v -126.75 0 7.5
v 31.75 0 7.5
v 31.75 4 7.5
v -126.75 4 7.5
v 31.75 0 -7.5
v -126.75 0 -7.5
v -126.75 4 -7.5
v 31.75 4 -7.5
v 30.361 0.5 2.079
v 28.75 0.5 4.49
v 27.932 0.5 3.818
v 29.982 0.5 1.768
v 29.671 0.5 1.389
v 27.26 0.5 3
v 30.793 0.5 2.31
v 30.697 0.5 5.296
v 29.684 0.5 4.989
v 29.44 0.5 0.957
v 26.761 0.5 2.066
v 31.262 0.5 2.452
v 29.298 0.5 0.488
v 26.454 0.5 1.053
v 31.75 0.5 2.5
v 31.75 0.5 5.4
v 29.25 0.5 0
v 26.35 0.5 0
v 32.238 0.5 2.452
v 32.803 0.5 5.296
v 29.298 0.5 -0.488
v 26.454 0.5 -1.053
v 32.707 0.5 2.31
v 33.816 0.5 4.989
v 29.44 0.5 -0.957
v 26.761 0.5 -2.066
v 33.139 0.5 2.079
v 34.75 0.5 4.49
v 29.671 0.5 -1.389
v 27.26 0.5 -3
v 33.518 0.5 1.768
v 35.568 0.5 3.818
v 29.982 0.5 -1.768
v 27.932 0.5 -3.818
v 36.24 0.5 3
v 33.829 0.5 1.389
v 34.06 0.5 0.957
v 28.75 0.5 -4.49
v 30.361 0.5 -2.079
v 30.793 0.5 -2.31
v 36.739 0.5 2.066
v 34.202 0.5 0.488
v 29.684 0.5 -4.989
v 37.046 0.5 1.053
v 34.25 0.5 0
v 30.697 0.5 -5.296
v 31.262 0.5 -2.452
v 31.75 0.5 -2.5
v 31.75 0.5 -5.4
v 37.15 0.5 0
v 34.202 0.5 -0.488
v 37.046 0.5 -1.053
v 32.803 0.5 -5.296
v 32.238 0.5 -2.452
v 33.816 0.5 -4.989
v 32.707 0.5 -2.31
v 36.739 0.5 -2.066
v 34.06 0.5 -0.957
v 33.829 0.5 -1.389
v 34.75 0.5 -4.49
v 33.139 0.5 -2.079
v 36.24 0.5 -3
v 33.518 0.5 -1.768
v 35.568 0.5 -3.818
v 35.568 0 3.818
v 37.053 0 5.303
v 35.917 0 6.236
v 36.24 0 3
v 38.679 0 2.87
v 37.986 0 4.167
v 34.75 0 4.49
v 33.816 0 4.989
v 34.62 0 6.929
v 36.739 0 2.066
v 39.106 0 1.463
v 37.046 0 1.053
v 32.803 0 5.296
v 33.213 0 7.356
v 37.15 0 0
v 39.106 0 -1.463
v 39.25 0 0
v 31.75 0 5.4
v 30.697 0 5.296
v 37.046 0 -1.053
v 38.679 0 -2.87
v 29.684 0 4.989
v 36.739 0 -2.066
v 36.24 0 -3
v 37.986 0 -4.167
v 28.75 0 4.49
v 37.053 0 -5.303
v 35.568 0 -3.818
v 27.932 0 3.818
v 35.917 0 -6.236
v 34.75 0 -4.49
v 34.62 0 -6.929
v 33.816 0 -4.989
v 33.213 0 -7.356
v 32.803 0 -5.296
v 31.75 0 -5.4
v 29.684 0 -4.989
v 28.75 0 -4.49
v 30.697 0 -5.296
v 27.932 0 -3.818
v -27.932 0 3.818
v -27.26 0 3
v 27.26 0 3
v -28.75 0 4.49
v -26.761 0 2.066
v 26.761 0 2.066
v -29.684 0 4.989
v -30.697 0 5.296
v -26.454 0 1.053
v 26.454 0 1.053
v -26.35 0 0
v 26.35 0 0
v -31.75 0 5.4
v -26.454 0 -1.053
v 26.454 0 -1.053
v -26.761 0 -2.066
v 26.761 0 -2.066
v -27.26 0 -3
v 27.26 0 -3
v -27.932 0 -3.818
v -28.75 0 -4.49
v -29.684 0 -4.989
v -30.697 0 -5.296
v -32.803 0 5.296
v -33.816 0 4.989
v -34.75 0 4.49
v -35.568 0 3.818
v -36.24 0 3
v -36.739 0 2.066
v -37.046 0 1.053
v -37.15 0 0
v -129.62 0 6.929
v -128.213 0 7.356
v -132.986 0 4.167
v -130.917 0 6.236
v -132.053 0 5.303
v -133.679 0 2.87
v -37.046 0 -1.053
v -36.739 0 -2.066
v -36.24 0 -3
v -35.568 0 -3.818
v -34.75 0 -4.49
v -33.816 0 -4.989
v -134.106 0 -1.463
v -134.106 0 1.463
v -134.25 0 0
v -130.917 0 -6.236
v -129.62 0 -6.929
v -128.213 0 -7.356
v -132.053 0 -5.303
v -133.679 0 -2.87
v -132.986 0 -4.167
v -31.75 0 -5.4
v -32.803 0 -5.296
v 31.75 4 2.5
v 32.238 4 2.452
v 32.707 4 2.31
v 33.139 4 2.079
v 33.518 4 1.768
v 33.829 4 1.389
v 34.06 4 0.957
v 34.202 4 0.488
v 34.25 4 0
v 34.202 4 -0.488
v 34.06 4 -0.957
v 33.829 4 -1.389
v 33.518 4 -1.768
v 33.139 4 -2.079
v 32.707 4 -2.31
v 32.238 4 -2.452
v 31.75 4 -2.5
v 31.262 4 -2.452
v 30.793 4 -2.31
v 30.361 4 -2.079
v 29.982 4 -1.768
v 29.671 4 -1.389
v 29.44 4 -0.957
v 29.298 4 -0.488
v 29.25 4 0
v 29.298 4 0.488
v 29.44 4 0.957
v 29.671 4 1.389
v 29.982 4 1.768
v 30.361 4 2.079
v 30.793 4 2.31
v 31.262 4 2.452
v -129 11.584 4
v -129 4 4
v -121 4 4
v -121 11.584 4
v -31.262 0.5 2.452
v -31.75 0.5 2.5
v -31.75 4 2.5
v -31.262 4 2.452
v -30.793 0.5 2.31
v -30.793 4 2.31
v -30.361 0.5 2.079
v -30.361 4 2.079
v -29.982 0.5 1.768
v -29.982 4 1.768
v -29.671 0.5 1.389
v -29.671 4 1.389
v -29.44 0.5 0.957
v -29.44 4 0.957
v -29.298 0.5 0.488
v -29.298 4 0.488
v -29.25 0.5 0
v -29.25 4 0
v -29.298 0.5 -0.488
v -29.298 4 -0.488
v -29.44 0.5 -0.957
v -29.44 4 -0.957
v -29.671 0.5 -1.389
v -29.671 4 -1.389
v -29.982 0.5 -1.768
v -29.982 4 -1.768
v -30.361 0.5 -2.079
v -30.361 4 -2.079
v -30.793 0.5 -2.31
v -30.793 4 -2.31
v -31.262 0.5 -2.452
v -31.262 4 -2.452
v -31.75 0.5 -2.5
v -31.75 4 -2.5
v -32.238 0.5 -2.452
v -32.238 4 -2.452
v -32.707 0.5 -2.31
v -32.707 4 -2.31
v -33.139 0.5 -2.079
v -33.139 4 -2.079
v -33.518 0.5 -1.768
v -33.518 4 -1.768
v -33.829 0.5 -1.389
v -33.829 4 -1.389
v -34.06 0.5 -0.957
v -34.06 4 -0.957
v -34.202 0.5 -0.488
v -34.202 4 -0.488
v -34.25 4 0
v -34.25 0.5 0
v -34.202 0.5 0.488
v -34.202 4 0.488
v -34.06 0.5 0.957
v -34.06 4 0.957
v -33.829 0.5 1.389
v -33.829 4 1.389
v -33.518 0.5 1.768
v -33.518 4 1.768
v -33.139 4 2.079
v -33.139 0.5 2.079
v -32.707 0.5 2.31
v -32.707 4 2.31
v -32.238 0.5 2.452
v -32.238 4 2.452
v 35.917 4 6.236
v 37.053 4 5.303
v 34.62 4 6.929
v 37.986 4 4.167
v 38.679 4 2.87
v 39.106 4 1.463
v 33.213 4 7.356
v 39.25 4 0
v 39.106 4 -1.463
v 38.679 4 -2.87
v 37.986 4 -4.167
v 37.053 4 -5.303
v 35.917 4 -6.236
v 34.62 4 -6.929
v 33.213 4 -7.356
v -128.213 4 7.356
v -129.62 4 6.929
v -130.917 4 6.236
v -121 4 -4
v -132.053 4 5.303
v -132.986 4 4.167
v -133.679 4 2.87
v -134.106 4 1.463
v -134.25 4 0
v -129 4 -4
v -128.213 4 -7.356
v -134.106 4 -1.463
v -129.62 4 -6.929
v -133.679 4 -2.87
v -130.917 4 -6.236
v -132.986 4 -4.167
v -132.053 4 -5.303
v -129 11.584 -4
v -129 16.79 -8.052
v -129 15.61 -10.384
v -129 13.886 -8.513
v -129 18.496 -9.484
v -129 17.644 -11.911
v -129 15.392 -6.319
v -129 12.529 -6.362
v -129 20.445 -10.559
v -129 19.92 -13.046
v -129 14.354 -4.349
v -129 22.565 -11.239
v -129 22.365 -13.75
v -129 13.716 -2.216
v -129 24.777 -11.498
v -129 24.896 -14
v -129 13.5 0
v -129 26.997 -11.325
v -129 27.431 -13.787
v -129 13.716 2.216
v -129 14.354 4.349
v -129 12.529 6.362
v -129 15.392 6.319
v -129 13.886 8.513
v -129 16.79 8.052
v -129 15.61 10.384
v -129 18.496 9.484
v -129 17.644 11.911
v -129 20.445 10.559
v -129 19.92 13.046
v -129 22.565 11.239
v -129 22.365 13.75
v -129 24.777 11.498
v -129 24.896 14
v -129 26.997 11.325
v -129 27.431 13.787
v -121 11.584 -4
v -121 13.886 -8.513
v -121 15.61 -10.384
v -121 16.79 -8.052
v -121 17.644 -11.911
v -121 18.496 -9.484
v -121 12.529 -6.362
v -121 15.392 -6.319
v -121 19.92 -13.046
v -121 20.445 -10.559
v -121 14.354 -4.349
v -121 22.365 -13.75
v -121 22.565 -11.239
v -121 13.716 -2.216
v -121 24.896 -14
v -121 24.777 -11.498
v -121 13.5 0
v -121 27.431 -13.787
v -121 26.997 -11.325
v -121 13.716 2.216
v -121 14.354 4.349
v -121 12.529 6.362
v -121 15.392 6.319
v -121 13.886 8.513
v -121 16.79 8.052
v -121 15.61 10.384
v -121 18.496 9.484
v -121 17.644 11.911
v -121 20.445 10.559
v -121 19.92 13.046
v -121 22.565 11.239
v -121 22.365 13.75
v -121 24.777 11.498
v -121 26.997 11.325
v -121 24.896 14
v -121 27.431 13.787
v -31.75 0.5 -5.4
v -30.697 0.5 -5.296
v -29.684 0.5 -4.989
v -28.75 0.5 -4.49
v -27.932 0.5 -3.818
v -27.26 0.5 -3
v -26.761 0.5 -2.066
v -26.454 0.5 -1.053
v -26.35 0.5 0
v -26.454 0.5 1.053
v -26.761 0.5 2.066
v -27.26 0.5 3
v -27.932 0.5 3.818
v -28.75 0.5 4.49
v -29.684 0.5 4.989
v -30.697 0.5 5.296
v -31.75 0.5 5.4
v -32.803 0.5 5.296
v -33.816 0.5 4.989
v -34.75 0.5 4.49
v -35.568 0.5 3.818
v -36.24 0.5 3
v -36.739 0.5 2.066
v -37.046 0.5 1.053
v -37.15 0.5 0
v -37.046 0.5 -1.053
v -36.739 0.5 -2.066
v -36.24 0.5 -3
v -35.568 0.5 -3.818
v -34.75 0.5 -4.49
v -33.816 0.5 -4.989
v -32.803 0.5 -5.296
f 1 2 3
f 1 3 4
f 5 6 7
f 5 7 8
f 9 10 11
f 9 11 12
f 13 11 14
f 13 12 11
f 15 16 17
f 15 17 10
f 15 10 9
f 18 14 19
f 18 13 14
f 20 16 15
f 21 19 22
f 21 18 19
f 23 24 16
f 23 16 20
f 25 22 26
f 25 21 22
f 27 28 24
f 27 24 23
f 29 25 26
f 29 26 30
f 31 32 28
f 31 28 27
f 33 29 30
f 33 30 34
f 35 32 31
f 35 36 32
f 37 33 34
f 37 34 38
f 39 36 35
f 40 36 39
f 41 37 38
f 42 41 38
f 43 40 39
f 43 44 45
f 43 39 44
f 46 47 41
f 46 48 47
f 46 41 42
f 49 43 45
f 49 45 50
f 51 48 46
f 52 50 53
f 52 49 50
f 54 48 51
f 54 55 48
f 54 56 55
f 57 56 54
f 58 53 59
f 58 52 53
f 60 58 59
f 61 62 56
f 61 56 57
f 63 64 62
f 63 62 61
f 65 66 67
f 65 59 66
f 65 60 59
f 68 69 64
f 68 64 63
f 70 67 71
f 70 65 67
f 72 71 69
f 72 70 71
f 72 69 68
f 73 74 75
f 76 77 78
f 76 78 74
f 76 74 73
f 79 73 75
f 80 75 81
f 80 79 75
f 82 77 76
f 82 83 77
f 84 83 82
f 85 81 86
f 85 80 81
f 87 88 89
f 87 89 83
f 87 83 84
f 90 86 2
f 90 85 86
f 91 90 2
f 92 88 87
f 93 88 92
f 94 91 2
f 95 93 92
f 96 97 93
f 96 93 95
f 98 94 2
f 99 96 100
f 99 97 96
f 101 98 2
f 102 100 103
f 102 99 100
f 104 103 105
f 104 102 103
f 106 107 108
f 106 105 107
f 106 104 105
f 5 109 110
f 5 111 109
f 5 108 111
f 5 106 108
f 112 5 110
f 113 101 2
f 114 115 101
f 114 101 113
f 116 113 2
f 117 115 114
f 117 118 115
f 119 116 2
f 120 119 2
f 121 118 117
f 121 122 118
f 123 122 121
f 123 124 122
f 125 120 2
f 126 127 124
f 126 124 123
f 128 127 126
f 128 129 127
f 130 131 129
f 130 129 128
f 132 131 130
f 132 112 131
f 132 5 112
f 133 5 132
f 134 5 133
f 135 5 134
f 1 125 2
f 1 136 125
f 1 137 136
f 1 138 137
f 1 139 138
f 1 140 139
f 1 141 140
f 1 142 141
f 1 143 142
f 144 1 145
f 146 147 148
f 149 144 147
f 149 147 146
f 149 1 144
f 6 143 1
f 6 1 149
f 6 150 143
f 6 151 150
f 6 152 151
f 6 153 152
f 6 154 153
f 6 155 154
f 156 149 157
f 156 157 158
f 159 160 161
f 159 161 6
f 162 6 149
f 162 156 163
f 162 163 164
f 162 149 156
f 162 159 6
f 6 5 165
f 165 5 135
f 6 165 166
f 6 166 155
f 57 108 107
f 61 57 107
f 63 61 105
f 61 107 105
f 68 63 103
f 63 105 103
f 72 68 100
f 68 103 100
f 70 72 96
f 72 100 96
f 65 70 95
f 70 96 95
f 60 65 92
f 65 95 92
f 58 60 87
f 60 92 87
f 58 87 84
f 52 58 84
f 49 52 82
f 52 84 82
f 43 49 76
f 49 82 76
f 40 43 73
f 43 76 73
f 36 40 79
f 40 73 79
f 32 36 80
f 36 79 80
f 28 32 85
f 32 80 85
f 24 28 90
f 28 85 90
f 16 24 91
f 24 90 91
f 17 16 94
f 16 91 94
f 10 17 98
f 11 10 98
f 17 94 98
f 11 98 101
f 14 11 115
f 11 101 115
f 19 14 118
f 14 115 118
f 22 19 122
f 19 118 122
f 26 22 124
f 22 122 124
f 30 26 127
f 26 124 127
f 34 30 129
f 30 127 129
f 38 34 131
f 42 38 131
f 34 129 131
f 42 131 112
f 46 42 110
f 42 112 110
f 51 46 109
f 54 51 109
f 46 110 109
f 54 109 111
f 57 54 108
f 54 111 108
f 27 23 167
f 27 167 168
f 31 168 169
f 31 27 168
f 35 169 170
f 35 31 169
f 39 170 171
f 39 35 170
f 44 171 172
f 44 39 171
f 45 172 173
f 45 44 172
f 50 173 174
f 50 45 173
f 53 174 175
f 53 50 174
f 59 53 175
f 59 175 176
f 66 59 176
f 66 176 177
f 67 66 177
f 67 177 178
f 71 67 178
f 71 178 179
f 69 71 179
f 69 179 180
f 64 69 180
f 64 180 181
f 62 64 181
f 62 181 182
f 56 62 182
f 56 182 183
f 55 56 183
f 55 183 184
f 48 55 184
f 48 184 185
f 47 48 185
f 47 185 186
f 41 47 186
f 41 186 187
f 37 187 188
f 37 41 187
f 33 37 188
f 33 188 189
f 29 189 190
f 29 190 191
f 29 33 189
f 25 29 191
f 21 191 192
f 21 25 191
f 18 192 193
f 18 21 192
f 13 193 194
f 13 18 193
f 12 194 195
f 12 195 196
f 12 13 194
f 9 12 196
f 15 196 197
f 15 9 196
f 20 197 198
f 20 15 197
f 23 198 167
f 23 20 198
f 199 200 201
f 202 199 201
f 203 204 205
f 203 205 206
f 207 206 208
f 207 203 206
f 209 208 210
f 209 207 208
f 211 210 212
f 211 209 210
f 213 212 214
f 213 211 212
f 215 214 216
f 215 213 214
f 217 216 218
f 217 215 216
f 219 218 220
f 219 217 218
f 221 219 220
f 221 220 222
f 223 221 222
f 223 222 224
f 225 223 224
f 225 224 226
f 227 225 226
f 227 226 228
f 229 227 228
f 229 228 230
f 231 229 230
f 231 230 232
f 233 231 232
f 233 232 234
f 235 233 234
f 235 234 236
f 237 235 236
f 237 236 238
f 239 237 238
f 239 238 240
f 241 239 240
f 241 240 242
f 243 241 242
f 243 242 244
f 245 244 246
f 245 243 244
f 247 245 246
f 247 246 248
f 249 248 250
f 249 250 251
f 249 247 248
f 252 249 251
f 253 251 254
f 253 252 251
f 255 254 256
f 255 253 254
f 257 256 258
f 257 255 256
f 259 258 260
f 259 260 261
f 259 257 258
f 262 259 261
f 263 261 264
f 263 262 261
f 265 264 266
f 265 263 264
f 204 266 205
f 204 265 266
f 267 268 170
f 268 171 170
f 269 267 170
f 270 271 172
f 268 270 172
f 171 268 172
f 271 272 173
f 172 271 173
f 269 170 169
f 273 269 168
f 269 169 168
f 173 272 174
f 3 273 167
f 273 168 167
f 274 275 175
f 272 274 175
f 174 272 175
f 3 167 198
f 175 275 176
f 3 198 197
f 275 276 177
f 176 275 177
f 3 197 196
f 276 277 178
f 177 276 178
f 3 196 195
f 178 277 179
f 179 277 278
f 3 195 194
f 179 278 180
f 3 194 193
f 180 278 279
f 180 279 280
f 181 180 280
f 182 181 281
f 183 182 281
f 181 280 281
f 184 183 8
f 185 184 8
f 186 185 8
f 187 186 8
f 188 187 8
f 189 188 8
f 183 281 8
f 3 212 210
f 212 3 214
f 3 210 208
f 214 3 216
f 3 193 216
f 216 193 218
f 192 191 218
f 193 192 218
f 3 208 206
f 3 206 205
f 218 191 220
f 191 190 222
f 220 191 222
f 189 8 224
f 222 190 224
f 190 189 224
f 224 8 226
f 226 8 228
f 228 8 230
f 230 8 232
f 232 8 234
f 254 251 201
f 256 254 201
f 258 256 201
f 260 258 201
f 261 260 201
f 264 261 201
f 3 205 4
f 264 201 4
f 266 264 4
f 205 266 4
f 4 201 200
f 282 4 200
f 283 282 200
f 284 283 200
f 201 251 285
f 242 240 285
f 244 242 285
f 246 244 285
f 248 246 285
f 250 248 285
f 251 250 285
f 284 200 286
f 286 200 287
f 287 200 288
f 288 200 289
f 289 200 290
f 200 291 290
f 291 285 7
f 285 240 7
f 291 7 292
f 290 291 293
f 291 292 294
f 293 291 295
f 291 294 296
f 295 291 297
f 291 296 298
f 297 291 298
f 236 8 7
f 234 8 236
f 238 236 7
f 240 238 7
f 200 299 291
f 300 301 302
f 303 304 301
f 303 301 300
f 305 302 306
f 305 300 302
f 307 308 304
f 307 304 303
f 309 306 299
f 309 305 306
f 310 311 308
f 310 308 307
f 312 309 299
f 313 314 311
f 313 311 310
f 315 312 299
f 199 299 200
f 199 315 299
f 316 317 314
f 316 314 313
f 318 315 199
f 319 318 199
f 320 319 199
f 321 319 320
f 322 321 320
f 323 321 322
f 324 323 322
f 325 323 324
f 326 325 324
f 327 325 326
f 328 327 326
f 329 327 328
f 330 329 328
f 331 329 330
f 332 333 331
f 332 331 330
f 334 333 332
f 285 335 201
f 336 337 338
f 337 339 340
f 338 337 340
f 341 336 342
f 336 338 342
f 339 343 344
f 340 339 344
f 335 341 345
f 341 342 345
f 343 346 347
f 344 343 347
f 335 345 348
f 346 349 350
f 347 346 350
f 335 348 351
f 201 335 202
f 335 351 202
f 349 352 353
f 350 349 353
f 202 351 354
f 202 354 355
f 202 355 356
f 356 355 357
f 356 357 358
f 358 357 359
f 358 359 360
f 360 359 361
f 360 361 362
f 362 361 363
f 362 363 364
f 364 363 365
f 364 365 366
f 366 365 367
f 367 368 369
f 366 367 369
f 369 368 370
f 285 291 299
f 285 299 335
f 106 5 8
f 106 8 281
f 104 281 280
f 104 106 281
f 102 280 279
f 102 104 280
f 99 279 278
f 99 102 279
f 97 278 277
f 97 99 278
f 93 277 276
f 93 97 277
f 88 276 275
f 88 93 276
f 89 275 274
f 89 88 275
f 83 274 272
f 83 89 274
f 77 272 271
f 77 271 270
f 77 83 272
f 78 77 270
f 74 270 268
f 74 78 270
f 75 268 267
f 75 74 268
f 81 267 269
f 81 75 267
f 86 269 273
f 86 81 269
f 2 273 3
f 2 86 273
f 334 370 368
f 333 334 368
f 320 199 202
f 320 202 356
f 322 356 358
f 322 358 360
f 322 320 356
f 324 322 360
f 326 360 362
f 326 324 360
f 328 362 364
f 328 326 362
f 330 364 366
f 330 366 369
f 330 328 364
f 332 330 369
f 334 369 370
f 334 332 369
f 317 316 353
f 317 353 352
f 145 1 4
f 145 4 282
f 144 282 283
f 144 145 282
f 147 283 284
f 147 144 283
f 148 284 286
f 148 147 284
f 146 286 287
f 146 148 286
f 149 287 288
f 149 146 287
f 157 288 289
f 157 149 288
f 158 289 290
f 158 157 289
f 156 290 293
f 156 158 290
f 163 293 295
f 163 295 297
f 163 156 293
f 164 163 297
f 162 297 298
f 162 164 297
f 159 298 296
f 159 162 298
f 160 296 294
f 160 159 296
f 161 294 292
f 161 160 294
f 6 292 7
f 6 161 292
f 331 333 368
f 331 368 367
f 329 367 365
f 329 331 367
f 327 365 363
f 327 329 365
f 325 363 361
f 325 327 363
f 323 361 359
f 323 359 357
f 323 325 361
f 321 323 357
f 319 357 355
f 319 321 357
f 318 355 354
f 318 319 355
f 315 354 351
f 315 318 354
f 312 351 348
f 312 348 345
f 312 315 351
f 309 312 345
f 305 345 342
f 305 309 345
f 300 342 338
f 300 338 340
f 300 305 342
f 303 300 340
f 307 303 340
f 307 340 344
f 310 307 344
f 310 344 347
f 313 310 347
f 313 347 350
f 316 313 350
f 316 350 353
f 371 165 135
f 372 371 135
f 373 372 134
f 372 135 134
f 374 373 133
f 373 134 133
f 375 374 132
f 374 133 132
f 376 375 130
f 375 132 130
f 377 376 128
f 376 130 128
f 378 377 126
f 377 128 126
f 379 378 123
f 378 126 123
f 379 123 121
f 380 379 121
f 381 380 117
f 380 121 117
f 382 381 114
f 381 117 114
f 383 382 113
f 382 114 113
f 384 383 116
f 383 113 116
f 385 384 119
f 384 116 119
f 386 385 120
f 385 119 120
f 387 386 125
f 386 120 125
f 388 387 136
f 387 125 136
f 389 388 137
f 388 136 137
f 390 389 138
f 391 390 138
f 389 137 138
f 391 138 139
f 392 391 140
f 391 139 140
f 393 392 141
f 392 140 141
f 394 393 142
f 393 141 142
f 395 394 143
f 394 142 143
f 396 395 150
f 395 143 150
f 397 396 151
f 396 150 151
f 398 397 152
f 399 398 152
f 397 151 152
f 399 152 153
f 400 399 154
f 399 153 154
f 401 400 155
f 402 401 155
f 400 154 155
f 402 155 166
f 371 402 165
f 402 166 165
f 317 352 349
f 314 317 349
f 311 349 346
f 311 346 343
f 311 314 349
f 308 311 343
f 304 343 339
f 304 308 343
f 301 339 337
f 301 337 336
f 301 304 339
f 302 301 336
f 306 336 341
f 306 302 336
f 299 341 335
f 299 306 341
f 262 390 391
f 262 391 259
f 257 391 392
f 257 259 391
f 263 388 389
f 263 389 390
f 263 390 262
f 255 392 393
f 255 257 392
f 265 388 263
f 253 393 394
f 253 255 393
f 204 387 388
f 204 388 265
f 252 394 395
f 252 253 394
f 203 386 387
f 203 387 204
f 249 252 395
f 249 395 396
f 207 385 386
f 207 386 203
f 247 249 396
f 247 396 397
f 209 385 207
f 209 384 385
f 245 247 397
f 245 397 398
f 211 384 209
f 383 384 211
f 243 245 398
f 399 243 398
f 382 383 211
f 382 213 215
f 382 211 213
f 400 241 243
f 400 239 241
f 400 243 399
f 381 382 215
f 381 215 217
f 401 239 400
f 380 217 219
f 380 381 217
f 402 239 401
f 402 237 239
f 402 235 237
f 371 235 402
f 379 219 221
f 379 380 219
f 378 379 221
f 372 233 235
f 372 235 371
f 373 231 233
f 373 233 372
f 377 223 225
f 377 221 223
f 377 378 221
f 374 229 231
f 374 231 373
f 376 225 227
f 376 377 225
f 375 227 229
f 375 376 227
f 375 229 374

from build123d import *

# Parameters (mm, degrees)
SKETCH2_R                = 2.5
BOSS_EXTRUDE1_DEPTH      = 4
BOSS_EXTRUDE2_DEPTH      = 4
BOSS_EXTRUDE2_DEPTH_BACK = 4
BOSS_EXTRUDE3_REACH      = 138.997
BOSS_EXTRUDE3_END_RADIUS = 14
SKETCH4_W                = 8
SKETCH4_H                = 8
SKETCH5_R                = 5.4
CUT_EXTRUDE1_DEPTH       = 0.5


with BuildPart() as part:
    # Sketch2 → Boss-Extrude1 (new body)
    with BuildSketch(Plane(origin=(0, 0, 0), x_dir=(1, 0, 0), z_dir=(0, 1, 0))):
        with BuildLine():
            Line((-126.75, 7.5), (31.75, 7.5))
            ThreePointArc((31.75, 7.5), (39.25, 0), (31.75, -7.5))
            Line((31.75, -7.5), (-126.75, -7.5))
            ThreePointArc((-126.75, -7.5), (-134.25, 0), (-126.75, 7.5))
        make_face()
        with Locations((-31.75, 0)):
            Circle(SKETCH2_R, mode=Mode.SUBTRACT)
        with Locations((31.75, 0)):
            Circle(SKETCH2_R, mode=Mode.SUBTRACT)
    extrude(amount=BOSS_EXTRUDE1_DEPTH)



with BuildPart() as body_2:
    # Sketch3 → Boss-Extrude2 (new, two sides: drawn at the far end of the back side and taken through both)
    with BuildSketch(Plane(origin=(-125, 0, 0), x_dir=(0, 0, -1), z_dir=(1, 0, 0)).offset(-BOSS_EXTRUDE2_DEPTH_BACK)):
        with BuildLine():
            Line((-13.787308542, 27.431074487), (-11.32528916, 26.996954043))
            ThreePointArc((-11.32528916, 26.996954043), (0, 13.5), (11.32528916, 26.996954043))
            Line((11.32528916, 26.996954043), (13.787308542, 27.431074487))
            ThreePointArc((13.787308542, 27.431074487), (0, 11), (-13.787308542, 27.431074487))
        make_face()
    extrude(amount=BOSS_EXTRUDE2_DEPTH + BOSS_EXTRUDE2_DEPTH_BACK)


with BuildPart() as part_1:
    add(part.part)

    add(body_2.part)  # Boss-Extrude3 merges body 2
    # Boss-Extrude3: up to this cylinder (the profile starts outside it)
    boss_extrude3_end = Plane(origin=(-125, 25, 0), z_dir=(1, 0, 0)) * Cylinder(BOSS_EXTRUDE3_END_RADIUS, 306.994, mode=Mode.PRIVATE)
    # Sketch4 → Boss-Extrude3 (add, up to the surface)
    with BuildSketch(Plane(origin=(0, 4, 0), x_dir=(1, 0, 0), z_dir=(0, 1, 0)), mode=Mode.PRIVATE) as boss_extrude3_sk1:
        with Locations((-125, 0)):
            Rectangle(SKETCH4_W, SKETCH4_H)
    boss_extrude3_tool1 = extrude(boss_extrude3_sk1.sketch, amount=BOSS_EXTRUDE3_REACH, mode=Mode.PRIVATE) - boss_extrude3_end
    add(boss_extrude3_tool1.solids().sort_by_distance((-125, 4, 0))[0])

    # Sketch5 → Cut-Extrude1 (cut)
    with BuildSketch(Plane.XZ):
        with Locations((-31.75, 0)):
            Circle(SKETCH5_R)
        with Locations((31.75, 0)):
            Circle(SKETCH5_R)
    extrude(amount=-CUT_EXTRUDE1_DEPTH, mode=Mode.SUBTRACT)


solid = part_1.part
